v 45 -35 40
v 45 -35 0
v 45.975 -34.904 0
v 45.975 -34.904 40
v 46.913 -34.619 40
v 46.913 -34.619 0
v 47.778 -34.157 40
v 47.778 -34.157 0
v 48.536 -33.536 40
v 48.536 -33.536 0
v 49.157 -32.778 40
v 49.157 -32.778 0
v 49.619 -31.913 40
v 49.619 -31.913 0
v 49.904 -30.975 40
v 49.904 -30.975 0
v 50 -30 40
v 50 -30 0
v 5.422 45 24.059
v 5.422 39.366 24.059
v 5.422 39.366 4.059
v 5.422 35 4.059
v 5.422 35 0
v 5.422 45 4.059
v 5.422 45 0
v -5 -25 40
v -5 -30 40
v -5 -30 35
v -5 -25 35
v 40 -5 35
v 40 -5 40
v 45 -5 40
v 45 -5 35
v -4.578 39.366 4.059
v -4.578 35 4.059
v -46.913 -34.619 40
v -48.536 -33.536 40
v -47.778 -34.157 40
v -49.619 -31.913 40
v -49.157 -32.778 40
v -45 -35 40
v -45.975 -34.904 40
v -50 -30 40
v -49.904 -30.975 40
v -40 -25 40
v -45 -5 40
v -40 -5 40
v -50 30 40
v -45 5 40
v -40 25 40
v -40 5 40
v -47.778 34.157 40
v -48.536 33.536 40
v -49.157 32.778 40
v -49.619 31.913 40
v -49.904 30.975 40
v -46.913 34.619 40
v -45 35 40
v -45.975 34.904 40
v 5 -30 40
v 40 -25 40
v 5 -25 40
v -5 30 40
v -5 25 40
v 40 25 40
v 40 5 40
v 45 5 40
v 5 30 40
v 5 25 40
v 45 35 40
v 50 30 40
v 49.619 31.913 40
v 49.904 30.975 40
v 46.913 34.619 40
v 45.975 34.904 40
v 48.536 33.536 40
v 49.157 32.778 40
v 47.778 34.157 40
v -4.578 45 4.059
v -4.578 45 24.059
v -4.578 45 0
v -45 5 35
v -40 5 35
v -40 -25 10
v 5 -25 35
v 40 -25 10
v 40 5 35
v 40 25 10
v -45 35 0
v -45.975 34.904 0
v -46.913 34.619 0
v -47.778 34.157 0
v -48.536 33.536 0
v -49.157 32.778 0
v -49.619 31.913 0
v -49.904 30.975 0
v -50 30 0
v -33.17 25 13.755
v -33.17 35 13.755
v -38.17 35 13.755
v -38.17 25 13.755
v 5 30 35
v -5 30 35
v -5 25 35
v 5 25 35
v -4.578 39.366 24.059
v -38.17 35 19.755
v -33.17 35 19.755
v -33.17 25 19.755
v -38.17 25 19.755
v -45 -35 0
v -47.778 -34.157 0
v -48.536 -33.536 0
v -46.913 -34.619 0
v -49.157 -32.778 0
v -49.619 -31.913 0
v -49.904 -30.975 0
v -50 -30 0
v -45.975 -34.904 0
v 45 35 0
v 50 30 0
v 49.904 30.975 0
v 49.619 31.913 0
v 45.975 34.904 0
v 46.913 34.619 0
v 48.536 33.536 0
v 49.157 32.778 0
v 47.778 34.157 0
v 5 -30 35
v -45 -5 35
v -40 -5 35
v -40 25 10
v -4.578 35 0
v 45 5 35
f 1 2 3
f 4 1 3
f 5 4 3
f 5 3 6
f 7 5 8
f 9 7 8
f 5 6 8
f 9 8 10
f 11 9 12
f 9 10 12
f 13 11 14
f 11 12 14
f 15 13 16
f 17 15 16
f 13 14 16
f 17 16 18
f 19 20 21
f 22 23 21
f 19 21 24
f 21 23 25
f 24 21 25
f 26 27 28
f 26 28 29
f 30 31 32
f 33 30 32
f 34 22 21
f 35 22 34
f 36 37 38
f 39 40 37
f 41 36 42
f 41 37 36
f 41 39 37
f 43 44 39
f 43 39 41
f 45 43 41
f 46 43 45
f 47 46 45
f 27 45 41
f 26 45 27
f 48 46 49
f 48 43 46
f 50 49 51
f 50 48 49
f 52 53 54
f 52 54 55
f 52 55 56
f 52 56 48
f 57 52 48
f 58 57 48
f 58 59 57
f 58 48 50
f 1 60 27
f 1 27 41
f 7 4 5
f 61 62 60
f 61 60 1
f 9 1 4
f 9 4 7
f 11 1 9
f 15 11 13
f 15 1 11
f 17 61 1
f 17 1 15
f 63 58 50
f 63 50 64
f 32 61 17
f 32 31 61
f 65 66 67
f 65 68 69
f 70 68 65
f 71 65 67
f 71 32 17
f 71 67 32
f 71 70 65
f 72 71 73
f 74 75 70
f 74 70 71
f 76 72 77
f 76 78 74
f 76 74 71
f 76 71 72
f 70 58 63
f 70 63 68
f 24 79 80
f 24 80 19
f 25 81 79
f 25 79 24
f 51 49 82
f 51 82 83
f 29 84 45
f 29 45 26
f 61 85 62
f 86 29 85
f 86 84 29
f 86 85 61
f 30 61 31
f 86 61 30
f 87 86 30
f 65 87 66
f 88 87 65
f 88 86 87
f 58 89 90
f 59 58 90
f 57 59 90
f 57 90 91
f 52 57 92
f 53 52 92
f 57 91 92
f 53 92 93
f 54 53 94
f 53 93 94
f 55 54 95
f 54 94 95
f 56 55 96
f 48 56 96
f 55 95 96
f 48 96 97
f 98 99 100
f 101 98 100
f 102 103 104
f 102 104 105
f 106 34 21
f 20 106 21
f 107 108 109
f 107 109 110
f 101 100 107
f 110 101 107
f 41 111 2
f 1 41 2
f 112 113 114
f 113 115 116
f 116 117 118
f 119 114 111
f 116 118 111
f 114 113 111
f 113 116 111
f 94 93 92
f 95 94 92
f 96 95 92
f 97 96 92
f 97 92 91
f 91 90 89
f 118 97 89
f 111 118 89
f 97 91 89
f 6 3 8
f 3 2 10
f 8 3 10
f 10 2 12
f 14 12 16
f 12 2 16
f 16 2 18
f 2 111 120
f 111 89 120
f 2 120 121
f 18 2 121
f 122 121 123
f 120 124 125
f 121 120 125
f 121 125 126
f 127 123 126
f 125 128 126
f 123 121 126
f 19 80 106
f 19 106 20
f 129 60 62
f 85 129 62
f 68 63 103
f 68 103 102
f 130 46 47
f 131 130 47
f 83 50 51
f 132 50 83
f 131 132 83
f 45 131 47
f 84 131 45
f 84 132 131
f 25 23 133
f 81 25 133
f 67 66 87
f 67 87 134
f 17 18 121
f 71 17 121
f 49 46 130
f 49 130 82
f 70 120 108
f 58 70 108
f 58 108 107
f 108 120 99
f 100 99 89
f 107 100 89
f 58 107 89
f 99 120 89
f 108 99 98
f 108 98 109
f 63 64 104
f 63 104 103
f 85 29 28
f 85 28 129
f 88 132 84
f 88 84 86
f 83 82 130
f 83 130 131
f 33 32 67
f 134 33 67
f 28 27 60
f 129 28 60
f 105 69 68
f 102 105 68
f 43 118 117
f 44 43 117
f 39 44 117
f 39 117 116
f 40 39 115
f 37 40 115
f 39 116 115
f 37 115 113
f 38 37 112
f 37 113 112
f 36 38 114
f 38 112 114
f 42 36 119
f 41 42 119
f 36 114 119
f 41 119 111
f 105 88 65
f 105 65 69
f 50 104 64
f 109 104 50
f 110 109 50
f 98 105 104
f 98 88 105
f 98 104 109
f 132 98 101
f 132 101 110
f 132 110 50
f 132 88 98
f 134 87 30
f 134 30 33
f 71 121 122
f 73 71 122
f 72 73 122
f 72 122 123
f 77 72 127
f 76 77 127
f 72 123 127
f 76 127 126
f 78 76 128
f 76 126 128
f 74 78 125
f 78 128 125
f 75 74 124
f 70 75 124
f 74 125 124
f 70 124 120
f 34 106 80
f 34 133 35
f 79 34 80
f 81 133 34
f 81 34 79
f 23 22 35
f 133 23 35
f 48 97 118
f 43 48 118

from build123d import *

# Parameters (mm, degrees)
F1_DEPTH  = 40
F2_T      = -10
F3_W      = 10
F3_H      = 4.0589590073
F4_DEPTH  = 10
F5_W      = 10
F5_H      = 5.6341049075
F6_DEPTH  = 20
F7_W      = 10
F7_H      = 5
F7_W_2    = 5
F7_H_2    = 10
F8_DEPTH  = 5
F9_W      = 5
F9_H      = 6
F10_DEPTH = 10


with BuildPart() as f1:
    # F0 (on Top) → F1 (new body)
    with BuildSketch(Plane.XY):
        with BuildLine():
            Line((45, 35), (-45, 35))
            ThreePointArc((-45, 35), (-48.5355339059, 33.5355339059), (-50, 30))
            Line((-50, 30), (-50, -30))
            ThreePointArc((-50, -30), (-48.5355339059, -33.5355339059), (-45, -35))
            Line((-45, -35), (45, -35))
            ThreePointArc((45, -35), (48.5355339059, -33.5355339059), (50, -30))
            Line((50, -30), (50, 30))
            ThreePointArc((50, 30), (48.5355339059, 33.5355339059), (45, 35))
        make_face()
    extrude(amount=F1_DEPTH)

    # F2
    f2_openings = [f1.faces().sort_by_distance(p)[0] for p in [
        (0, 0, 40),
    ]]
    offset(amount=F2_T, openings=f2_openings)

    # F7 (on face) → F8 (cut)
    with BuildSketch(Plane.XY.offset(40)):
        with Locations((0, 27.5)):
            Rectangle(F7_W, F7_H)
        with Locations((-42.5, 0)):
            Rectangle(F7_W_2, F7_H_2)
        with Locations((42.5, 0)):
            Rectangle(F7_W_2, F7_H_2)
        with Locations((0, -27.5)):
            Rectangle(F7_W, F7_H)
    extrude(amount=-F8_DEPTH, mode=Mode.SUBTRACT)

    # F9 (on face) → F10 (cut)
    with BuildSketch(Plane(origin=(0, 35, 0), x_dir=(-1, 0, 0), z_dir=(0, 1, 0))):
        with Locations((35.6704313308, 16.7554157438)):
            Rectangle(F9_W, F9_H)
    extrude(amount=-F10_DEPTH, mode=Mode.SUBTRACT)


with BuildPart() as f4:
    # F3 (on face) → F4 (new body)
    with BuildSketch(Plane(origin=(0, 35, 0), x_dir=(-1, 0, 0), z_dir=(0, 1, 0))):
        with Locations((-0.4221891332, 2.0294795036)):
            Rectangle(F3_W, F3_H)
    extrude(amount=F4_DEPTH)

    # F5 (on face) → F6 (join)
    with BuildSketch(Plane.XY.offset(4.0589590073)):
        with Locations((0.4221891332, 42.1829475462)):
            Rectangle(F5_W, F5_H)
    extrude(amount=F6_DEPTH)


solid = Compound([f1.part, f4.part])
